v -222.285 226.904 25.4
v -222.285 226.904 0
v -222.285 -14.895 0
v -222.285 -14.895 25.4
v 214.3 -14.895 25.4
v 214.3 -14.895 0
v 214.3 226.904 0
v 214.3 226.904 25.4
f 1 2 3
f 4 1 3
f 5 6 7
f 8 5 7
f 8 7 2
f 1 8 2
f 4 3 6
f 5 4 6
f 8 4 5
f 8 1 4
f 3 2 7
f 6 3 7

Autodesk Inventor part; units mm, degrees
ref_plane "YZ Plane" through (0, 0, 0) normal (1, 0, 0) x (0, 1, 0)
ref_plane "XZ Plane" through (0, 0, 0) normal (0, 1, 0) x (-1, 0, 0)
ref_plane "XY Plane" through (0, 0, 0) normal (0, 0, 1) x (1, 0, 0)
sketch "Sketch1" plane through (0, 0, 0) normal (0, 0, 1) x (1, 0, 0)
  line L0 (-198.4602, 0) -> (214.3004, 0)
  line L1 (214.3004, 0) -> (214.3004, 118.9542)
  line L2 (214.3004, 118.9542) -> (-198.4602, 118.9542)
  line L3 (-198.4602, 118.9542) -> (-198.4602, 0)
  point P0 (0, 0)
extrude "Extrusion1" add sketch "Sketch1" along normal blind 25.4
move faces "Move1" translate (0, -14.8951, 0) faces at (-60.8733, 0, 8.4667)
move faces "Move2" translate (0, 107.95, 0) faces at (-60.8733, 118.9542, 16.9333)
move faces "Move3" translate (-122.2502, 0, 0) faces at (-198.4602, 65.7047, 16.9333)
move faces "Move4" translate (98.425, 0, 0) faces at (-320.7104, 65.7047, 16.9333)
properties part number "Table"
